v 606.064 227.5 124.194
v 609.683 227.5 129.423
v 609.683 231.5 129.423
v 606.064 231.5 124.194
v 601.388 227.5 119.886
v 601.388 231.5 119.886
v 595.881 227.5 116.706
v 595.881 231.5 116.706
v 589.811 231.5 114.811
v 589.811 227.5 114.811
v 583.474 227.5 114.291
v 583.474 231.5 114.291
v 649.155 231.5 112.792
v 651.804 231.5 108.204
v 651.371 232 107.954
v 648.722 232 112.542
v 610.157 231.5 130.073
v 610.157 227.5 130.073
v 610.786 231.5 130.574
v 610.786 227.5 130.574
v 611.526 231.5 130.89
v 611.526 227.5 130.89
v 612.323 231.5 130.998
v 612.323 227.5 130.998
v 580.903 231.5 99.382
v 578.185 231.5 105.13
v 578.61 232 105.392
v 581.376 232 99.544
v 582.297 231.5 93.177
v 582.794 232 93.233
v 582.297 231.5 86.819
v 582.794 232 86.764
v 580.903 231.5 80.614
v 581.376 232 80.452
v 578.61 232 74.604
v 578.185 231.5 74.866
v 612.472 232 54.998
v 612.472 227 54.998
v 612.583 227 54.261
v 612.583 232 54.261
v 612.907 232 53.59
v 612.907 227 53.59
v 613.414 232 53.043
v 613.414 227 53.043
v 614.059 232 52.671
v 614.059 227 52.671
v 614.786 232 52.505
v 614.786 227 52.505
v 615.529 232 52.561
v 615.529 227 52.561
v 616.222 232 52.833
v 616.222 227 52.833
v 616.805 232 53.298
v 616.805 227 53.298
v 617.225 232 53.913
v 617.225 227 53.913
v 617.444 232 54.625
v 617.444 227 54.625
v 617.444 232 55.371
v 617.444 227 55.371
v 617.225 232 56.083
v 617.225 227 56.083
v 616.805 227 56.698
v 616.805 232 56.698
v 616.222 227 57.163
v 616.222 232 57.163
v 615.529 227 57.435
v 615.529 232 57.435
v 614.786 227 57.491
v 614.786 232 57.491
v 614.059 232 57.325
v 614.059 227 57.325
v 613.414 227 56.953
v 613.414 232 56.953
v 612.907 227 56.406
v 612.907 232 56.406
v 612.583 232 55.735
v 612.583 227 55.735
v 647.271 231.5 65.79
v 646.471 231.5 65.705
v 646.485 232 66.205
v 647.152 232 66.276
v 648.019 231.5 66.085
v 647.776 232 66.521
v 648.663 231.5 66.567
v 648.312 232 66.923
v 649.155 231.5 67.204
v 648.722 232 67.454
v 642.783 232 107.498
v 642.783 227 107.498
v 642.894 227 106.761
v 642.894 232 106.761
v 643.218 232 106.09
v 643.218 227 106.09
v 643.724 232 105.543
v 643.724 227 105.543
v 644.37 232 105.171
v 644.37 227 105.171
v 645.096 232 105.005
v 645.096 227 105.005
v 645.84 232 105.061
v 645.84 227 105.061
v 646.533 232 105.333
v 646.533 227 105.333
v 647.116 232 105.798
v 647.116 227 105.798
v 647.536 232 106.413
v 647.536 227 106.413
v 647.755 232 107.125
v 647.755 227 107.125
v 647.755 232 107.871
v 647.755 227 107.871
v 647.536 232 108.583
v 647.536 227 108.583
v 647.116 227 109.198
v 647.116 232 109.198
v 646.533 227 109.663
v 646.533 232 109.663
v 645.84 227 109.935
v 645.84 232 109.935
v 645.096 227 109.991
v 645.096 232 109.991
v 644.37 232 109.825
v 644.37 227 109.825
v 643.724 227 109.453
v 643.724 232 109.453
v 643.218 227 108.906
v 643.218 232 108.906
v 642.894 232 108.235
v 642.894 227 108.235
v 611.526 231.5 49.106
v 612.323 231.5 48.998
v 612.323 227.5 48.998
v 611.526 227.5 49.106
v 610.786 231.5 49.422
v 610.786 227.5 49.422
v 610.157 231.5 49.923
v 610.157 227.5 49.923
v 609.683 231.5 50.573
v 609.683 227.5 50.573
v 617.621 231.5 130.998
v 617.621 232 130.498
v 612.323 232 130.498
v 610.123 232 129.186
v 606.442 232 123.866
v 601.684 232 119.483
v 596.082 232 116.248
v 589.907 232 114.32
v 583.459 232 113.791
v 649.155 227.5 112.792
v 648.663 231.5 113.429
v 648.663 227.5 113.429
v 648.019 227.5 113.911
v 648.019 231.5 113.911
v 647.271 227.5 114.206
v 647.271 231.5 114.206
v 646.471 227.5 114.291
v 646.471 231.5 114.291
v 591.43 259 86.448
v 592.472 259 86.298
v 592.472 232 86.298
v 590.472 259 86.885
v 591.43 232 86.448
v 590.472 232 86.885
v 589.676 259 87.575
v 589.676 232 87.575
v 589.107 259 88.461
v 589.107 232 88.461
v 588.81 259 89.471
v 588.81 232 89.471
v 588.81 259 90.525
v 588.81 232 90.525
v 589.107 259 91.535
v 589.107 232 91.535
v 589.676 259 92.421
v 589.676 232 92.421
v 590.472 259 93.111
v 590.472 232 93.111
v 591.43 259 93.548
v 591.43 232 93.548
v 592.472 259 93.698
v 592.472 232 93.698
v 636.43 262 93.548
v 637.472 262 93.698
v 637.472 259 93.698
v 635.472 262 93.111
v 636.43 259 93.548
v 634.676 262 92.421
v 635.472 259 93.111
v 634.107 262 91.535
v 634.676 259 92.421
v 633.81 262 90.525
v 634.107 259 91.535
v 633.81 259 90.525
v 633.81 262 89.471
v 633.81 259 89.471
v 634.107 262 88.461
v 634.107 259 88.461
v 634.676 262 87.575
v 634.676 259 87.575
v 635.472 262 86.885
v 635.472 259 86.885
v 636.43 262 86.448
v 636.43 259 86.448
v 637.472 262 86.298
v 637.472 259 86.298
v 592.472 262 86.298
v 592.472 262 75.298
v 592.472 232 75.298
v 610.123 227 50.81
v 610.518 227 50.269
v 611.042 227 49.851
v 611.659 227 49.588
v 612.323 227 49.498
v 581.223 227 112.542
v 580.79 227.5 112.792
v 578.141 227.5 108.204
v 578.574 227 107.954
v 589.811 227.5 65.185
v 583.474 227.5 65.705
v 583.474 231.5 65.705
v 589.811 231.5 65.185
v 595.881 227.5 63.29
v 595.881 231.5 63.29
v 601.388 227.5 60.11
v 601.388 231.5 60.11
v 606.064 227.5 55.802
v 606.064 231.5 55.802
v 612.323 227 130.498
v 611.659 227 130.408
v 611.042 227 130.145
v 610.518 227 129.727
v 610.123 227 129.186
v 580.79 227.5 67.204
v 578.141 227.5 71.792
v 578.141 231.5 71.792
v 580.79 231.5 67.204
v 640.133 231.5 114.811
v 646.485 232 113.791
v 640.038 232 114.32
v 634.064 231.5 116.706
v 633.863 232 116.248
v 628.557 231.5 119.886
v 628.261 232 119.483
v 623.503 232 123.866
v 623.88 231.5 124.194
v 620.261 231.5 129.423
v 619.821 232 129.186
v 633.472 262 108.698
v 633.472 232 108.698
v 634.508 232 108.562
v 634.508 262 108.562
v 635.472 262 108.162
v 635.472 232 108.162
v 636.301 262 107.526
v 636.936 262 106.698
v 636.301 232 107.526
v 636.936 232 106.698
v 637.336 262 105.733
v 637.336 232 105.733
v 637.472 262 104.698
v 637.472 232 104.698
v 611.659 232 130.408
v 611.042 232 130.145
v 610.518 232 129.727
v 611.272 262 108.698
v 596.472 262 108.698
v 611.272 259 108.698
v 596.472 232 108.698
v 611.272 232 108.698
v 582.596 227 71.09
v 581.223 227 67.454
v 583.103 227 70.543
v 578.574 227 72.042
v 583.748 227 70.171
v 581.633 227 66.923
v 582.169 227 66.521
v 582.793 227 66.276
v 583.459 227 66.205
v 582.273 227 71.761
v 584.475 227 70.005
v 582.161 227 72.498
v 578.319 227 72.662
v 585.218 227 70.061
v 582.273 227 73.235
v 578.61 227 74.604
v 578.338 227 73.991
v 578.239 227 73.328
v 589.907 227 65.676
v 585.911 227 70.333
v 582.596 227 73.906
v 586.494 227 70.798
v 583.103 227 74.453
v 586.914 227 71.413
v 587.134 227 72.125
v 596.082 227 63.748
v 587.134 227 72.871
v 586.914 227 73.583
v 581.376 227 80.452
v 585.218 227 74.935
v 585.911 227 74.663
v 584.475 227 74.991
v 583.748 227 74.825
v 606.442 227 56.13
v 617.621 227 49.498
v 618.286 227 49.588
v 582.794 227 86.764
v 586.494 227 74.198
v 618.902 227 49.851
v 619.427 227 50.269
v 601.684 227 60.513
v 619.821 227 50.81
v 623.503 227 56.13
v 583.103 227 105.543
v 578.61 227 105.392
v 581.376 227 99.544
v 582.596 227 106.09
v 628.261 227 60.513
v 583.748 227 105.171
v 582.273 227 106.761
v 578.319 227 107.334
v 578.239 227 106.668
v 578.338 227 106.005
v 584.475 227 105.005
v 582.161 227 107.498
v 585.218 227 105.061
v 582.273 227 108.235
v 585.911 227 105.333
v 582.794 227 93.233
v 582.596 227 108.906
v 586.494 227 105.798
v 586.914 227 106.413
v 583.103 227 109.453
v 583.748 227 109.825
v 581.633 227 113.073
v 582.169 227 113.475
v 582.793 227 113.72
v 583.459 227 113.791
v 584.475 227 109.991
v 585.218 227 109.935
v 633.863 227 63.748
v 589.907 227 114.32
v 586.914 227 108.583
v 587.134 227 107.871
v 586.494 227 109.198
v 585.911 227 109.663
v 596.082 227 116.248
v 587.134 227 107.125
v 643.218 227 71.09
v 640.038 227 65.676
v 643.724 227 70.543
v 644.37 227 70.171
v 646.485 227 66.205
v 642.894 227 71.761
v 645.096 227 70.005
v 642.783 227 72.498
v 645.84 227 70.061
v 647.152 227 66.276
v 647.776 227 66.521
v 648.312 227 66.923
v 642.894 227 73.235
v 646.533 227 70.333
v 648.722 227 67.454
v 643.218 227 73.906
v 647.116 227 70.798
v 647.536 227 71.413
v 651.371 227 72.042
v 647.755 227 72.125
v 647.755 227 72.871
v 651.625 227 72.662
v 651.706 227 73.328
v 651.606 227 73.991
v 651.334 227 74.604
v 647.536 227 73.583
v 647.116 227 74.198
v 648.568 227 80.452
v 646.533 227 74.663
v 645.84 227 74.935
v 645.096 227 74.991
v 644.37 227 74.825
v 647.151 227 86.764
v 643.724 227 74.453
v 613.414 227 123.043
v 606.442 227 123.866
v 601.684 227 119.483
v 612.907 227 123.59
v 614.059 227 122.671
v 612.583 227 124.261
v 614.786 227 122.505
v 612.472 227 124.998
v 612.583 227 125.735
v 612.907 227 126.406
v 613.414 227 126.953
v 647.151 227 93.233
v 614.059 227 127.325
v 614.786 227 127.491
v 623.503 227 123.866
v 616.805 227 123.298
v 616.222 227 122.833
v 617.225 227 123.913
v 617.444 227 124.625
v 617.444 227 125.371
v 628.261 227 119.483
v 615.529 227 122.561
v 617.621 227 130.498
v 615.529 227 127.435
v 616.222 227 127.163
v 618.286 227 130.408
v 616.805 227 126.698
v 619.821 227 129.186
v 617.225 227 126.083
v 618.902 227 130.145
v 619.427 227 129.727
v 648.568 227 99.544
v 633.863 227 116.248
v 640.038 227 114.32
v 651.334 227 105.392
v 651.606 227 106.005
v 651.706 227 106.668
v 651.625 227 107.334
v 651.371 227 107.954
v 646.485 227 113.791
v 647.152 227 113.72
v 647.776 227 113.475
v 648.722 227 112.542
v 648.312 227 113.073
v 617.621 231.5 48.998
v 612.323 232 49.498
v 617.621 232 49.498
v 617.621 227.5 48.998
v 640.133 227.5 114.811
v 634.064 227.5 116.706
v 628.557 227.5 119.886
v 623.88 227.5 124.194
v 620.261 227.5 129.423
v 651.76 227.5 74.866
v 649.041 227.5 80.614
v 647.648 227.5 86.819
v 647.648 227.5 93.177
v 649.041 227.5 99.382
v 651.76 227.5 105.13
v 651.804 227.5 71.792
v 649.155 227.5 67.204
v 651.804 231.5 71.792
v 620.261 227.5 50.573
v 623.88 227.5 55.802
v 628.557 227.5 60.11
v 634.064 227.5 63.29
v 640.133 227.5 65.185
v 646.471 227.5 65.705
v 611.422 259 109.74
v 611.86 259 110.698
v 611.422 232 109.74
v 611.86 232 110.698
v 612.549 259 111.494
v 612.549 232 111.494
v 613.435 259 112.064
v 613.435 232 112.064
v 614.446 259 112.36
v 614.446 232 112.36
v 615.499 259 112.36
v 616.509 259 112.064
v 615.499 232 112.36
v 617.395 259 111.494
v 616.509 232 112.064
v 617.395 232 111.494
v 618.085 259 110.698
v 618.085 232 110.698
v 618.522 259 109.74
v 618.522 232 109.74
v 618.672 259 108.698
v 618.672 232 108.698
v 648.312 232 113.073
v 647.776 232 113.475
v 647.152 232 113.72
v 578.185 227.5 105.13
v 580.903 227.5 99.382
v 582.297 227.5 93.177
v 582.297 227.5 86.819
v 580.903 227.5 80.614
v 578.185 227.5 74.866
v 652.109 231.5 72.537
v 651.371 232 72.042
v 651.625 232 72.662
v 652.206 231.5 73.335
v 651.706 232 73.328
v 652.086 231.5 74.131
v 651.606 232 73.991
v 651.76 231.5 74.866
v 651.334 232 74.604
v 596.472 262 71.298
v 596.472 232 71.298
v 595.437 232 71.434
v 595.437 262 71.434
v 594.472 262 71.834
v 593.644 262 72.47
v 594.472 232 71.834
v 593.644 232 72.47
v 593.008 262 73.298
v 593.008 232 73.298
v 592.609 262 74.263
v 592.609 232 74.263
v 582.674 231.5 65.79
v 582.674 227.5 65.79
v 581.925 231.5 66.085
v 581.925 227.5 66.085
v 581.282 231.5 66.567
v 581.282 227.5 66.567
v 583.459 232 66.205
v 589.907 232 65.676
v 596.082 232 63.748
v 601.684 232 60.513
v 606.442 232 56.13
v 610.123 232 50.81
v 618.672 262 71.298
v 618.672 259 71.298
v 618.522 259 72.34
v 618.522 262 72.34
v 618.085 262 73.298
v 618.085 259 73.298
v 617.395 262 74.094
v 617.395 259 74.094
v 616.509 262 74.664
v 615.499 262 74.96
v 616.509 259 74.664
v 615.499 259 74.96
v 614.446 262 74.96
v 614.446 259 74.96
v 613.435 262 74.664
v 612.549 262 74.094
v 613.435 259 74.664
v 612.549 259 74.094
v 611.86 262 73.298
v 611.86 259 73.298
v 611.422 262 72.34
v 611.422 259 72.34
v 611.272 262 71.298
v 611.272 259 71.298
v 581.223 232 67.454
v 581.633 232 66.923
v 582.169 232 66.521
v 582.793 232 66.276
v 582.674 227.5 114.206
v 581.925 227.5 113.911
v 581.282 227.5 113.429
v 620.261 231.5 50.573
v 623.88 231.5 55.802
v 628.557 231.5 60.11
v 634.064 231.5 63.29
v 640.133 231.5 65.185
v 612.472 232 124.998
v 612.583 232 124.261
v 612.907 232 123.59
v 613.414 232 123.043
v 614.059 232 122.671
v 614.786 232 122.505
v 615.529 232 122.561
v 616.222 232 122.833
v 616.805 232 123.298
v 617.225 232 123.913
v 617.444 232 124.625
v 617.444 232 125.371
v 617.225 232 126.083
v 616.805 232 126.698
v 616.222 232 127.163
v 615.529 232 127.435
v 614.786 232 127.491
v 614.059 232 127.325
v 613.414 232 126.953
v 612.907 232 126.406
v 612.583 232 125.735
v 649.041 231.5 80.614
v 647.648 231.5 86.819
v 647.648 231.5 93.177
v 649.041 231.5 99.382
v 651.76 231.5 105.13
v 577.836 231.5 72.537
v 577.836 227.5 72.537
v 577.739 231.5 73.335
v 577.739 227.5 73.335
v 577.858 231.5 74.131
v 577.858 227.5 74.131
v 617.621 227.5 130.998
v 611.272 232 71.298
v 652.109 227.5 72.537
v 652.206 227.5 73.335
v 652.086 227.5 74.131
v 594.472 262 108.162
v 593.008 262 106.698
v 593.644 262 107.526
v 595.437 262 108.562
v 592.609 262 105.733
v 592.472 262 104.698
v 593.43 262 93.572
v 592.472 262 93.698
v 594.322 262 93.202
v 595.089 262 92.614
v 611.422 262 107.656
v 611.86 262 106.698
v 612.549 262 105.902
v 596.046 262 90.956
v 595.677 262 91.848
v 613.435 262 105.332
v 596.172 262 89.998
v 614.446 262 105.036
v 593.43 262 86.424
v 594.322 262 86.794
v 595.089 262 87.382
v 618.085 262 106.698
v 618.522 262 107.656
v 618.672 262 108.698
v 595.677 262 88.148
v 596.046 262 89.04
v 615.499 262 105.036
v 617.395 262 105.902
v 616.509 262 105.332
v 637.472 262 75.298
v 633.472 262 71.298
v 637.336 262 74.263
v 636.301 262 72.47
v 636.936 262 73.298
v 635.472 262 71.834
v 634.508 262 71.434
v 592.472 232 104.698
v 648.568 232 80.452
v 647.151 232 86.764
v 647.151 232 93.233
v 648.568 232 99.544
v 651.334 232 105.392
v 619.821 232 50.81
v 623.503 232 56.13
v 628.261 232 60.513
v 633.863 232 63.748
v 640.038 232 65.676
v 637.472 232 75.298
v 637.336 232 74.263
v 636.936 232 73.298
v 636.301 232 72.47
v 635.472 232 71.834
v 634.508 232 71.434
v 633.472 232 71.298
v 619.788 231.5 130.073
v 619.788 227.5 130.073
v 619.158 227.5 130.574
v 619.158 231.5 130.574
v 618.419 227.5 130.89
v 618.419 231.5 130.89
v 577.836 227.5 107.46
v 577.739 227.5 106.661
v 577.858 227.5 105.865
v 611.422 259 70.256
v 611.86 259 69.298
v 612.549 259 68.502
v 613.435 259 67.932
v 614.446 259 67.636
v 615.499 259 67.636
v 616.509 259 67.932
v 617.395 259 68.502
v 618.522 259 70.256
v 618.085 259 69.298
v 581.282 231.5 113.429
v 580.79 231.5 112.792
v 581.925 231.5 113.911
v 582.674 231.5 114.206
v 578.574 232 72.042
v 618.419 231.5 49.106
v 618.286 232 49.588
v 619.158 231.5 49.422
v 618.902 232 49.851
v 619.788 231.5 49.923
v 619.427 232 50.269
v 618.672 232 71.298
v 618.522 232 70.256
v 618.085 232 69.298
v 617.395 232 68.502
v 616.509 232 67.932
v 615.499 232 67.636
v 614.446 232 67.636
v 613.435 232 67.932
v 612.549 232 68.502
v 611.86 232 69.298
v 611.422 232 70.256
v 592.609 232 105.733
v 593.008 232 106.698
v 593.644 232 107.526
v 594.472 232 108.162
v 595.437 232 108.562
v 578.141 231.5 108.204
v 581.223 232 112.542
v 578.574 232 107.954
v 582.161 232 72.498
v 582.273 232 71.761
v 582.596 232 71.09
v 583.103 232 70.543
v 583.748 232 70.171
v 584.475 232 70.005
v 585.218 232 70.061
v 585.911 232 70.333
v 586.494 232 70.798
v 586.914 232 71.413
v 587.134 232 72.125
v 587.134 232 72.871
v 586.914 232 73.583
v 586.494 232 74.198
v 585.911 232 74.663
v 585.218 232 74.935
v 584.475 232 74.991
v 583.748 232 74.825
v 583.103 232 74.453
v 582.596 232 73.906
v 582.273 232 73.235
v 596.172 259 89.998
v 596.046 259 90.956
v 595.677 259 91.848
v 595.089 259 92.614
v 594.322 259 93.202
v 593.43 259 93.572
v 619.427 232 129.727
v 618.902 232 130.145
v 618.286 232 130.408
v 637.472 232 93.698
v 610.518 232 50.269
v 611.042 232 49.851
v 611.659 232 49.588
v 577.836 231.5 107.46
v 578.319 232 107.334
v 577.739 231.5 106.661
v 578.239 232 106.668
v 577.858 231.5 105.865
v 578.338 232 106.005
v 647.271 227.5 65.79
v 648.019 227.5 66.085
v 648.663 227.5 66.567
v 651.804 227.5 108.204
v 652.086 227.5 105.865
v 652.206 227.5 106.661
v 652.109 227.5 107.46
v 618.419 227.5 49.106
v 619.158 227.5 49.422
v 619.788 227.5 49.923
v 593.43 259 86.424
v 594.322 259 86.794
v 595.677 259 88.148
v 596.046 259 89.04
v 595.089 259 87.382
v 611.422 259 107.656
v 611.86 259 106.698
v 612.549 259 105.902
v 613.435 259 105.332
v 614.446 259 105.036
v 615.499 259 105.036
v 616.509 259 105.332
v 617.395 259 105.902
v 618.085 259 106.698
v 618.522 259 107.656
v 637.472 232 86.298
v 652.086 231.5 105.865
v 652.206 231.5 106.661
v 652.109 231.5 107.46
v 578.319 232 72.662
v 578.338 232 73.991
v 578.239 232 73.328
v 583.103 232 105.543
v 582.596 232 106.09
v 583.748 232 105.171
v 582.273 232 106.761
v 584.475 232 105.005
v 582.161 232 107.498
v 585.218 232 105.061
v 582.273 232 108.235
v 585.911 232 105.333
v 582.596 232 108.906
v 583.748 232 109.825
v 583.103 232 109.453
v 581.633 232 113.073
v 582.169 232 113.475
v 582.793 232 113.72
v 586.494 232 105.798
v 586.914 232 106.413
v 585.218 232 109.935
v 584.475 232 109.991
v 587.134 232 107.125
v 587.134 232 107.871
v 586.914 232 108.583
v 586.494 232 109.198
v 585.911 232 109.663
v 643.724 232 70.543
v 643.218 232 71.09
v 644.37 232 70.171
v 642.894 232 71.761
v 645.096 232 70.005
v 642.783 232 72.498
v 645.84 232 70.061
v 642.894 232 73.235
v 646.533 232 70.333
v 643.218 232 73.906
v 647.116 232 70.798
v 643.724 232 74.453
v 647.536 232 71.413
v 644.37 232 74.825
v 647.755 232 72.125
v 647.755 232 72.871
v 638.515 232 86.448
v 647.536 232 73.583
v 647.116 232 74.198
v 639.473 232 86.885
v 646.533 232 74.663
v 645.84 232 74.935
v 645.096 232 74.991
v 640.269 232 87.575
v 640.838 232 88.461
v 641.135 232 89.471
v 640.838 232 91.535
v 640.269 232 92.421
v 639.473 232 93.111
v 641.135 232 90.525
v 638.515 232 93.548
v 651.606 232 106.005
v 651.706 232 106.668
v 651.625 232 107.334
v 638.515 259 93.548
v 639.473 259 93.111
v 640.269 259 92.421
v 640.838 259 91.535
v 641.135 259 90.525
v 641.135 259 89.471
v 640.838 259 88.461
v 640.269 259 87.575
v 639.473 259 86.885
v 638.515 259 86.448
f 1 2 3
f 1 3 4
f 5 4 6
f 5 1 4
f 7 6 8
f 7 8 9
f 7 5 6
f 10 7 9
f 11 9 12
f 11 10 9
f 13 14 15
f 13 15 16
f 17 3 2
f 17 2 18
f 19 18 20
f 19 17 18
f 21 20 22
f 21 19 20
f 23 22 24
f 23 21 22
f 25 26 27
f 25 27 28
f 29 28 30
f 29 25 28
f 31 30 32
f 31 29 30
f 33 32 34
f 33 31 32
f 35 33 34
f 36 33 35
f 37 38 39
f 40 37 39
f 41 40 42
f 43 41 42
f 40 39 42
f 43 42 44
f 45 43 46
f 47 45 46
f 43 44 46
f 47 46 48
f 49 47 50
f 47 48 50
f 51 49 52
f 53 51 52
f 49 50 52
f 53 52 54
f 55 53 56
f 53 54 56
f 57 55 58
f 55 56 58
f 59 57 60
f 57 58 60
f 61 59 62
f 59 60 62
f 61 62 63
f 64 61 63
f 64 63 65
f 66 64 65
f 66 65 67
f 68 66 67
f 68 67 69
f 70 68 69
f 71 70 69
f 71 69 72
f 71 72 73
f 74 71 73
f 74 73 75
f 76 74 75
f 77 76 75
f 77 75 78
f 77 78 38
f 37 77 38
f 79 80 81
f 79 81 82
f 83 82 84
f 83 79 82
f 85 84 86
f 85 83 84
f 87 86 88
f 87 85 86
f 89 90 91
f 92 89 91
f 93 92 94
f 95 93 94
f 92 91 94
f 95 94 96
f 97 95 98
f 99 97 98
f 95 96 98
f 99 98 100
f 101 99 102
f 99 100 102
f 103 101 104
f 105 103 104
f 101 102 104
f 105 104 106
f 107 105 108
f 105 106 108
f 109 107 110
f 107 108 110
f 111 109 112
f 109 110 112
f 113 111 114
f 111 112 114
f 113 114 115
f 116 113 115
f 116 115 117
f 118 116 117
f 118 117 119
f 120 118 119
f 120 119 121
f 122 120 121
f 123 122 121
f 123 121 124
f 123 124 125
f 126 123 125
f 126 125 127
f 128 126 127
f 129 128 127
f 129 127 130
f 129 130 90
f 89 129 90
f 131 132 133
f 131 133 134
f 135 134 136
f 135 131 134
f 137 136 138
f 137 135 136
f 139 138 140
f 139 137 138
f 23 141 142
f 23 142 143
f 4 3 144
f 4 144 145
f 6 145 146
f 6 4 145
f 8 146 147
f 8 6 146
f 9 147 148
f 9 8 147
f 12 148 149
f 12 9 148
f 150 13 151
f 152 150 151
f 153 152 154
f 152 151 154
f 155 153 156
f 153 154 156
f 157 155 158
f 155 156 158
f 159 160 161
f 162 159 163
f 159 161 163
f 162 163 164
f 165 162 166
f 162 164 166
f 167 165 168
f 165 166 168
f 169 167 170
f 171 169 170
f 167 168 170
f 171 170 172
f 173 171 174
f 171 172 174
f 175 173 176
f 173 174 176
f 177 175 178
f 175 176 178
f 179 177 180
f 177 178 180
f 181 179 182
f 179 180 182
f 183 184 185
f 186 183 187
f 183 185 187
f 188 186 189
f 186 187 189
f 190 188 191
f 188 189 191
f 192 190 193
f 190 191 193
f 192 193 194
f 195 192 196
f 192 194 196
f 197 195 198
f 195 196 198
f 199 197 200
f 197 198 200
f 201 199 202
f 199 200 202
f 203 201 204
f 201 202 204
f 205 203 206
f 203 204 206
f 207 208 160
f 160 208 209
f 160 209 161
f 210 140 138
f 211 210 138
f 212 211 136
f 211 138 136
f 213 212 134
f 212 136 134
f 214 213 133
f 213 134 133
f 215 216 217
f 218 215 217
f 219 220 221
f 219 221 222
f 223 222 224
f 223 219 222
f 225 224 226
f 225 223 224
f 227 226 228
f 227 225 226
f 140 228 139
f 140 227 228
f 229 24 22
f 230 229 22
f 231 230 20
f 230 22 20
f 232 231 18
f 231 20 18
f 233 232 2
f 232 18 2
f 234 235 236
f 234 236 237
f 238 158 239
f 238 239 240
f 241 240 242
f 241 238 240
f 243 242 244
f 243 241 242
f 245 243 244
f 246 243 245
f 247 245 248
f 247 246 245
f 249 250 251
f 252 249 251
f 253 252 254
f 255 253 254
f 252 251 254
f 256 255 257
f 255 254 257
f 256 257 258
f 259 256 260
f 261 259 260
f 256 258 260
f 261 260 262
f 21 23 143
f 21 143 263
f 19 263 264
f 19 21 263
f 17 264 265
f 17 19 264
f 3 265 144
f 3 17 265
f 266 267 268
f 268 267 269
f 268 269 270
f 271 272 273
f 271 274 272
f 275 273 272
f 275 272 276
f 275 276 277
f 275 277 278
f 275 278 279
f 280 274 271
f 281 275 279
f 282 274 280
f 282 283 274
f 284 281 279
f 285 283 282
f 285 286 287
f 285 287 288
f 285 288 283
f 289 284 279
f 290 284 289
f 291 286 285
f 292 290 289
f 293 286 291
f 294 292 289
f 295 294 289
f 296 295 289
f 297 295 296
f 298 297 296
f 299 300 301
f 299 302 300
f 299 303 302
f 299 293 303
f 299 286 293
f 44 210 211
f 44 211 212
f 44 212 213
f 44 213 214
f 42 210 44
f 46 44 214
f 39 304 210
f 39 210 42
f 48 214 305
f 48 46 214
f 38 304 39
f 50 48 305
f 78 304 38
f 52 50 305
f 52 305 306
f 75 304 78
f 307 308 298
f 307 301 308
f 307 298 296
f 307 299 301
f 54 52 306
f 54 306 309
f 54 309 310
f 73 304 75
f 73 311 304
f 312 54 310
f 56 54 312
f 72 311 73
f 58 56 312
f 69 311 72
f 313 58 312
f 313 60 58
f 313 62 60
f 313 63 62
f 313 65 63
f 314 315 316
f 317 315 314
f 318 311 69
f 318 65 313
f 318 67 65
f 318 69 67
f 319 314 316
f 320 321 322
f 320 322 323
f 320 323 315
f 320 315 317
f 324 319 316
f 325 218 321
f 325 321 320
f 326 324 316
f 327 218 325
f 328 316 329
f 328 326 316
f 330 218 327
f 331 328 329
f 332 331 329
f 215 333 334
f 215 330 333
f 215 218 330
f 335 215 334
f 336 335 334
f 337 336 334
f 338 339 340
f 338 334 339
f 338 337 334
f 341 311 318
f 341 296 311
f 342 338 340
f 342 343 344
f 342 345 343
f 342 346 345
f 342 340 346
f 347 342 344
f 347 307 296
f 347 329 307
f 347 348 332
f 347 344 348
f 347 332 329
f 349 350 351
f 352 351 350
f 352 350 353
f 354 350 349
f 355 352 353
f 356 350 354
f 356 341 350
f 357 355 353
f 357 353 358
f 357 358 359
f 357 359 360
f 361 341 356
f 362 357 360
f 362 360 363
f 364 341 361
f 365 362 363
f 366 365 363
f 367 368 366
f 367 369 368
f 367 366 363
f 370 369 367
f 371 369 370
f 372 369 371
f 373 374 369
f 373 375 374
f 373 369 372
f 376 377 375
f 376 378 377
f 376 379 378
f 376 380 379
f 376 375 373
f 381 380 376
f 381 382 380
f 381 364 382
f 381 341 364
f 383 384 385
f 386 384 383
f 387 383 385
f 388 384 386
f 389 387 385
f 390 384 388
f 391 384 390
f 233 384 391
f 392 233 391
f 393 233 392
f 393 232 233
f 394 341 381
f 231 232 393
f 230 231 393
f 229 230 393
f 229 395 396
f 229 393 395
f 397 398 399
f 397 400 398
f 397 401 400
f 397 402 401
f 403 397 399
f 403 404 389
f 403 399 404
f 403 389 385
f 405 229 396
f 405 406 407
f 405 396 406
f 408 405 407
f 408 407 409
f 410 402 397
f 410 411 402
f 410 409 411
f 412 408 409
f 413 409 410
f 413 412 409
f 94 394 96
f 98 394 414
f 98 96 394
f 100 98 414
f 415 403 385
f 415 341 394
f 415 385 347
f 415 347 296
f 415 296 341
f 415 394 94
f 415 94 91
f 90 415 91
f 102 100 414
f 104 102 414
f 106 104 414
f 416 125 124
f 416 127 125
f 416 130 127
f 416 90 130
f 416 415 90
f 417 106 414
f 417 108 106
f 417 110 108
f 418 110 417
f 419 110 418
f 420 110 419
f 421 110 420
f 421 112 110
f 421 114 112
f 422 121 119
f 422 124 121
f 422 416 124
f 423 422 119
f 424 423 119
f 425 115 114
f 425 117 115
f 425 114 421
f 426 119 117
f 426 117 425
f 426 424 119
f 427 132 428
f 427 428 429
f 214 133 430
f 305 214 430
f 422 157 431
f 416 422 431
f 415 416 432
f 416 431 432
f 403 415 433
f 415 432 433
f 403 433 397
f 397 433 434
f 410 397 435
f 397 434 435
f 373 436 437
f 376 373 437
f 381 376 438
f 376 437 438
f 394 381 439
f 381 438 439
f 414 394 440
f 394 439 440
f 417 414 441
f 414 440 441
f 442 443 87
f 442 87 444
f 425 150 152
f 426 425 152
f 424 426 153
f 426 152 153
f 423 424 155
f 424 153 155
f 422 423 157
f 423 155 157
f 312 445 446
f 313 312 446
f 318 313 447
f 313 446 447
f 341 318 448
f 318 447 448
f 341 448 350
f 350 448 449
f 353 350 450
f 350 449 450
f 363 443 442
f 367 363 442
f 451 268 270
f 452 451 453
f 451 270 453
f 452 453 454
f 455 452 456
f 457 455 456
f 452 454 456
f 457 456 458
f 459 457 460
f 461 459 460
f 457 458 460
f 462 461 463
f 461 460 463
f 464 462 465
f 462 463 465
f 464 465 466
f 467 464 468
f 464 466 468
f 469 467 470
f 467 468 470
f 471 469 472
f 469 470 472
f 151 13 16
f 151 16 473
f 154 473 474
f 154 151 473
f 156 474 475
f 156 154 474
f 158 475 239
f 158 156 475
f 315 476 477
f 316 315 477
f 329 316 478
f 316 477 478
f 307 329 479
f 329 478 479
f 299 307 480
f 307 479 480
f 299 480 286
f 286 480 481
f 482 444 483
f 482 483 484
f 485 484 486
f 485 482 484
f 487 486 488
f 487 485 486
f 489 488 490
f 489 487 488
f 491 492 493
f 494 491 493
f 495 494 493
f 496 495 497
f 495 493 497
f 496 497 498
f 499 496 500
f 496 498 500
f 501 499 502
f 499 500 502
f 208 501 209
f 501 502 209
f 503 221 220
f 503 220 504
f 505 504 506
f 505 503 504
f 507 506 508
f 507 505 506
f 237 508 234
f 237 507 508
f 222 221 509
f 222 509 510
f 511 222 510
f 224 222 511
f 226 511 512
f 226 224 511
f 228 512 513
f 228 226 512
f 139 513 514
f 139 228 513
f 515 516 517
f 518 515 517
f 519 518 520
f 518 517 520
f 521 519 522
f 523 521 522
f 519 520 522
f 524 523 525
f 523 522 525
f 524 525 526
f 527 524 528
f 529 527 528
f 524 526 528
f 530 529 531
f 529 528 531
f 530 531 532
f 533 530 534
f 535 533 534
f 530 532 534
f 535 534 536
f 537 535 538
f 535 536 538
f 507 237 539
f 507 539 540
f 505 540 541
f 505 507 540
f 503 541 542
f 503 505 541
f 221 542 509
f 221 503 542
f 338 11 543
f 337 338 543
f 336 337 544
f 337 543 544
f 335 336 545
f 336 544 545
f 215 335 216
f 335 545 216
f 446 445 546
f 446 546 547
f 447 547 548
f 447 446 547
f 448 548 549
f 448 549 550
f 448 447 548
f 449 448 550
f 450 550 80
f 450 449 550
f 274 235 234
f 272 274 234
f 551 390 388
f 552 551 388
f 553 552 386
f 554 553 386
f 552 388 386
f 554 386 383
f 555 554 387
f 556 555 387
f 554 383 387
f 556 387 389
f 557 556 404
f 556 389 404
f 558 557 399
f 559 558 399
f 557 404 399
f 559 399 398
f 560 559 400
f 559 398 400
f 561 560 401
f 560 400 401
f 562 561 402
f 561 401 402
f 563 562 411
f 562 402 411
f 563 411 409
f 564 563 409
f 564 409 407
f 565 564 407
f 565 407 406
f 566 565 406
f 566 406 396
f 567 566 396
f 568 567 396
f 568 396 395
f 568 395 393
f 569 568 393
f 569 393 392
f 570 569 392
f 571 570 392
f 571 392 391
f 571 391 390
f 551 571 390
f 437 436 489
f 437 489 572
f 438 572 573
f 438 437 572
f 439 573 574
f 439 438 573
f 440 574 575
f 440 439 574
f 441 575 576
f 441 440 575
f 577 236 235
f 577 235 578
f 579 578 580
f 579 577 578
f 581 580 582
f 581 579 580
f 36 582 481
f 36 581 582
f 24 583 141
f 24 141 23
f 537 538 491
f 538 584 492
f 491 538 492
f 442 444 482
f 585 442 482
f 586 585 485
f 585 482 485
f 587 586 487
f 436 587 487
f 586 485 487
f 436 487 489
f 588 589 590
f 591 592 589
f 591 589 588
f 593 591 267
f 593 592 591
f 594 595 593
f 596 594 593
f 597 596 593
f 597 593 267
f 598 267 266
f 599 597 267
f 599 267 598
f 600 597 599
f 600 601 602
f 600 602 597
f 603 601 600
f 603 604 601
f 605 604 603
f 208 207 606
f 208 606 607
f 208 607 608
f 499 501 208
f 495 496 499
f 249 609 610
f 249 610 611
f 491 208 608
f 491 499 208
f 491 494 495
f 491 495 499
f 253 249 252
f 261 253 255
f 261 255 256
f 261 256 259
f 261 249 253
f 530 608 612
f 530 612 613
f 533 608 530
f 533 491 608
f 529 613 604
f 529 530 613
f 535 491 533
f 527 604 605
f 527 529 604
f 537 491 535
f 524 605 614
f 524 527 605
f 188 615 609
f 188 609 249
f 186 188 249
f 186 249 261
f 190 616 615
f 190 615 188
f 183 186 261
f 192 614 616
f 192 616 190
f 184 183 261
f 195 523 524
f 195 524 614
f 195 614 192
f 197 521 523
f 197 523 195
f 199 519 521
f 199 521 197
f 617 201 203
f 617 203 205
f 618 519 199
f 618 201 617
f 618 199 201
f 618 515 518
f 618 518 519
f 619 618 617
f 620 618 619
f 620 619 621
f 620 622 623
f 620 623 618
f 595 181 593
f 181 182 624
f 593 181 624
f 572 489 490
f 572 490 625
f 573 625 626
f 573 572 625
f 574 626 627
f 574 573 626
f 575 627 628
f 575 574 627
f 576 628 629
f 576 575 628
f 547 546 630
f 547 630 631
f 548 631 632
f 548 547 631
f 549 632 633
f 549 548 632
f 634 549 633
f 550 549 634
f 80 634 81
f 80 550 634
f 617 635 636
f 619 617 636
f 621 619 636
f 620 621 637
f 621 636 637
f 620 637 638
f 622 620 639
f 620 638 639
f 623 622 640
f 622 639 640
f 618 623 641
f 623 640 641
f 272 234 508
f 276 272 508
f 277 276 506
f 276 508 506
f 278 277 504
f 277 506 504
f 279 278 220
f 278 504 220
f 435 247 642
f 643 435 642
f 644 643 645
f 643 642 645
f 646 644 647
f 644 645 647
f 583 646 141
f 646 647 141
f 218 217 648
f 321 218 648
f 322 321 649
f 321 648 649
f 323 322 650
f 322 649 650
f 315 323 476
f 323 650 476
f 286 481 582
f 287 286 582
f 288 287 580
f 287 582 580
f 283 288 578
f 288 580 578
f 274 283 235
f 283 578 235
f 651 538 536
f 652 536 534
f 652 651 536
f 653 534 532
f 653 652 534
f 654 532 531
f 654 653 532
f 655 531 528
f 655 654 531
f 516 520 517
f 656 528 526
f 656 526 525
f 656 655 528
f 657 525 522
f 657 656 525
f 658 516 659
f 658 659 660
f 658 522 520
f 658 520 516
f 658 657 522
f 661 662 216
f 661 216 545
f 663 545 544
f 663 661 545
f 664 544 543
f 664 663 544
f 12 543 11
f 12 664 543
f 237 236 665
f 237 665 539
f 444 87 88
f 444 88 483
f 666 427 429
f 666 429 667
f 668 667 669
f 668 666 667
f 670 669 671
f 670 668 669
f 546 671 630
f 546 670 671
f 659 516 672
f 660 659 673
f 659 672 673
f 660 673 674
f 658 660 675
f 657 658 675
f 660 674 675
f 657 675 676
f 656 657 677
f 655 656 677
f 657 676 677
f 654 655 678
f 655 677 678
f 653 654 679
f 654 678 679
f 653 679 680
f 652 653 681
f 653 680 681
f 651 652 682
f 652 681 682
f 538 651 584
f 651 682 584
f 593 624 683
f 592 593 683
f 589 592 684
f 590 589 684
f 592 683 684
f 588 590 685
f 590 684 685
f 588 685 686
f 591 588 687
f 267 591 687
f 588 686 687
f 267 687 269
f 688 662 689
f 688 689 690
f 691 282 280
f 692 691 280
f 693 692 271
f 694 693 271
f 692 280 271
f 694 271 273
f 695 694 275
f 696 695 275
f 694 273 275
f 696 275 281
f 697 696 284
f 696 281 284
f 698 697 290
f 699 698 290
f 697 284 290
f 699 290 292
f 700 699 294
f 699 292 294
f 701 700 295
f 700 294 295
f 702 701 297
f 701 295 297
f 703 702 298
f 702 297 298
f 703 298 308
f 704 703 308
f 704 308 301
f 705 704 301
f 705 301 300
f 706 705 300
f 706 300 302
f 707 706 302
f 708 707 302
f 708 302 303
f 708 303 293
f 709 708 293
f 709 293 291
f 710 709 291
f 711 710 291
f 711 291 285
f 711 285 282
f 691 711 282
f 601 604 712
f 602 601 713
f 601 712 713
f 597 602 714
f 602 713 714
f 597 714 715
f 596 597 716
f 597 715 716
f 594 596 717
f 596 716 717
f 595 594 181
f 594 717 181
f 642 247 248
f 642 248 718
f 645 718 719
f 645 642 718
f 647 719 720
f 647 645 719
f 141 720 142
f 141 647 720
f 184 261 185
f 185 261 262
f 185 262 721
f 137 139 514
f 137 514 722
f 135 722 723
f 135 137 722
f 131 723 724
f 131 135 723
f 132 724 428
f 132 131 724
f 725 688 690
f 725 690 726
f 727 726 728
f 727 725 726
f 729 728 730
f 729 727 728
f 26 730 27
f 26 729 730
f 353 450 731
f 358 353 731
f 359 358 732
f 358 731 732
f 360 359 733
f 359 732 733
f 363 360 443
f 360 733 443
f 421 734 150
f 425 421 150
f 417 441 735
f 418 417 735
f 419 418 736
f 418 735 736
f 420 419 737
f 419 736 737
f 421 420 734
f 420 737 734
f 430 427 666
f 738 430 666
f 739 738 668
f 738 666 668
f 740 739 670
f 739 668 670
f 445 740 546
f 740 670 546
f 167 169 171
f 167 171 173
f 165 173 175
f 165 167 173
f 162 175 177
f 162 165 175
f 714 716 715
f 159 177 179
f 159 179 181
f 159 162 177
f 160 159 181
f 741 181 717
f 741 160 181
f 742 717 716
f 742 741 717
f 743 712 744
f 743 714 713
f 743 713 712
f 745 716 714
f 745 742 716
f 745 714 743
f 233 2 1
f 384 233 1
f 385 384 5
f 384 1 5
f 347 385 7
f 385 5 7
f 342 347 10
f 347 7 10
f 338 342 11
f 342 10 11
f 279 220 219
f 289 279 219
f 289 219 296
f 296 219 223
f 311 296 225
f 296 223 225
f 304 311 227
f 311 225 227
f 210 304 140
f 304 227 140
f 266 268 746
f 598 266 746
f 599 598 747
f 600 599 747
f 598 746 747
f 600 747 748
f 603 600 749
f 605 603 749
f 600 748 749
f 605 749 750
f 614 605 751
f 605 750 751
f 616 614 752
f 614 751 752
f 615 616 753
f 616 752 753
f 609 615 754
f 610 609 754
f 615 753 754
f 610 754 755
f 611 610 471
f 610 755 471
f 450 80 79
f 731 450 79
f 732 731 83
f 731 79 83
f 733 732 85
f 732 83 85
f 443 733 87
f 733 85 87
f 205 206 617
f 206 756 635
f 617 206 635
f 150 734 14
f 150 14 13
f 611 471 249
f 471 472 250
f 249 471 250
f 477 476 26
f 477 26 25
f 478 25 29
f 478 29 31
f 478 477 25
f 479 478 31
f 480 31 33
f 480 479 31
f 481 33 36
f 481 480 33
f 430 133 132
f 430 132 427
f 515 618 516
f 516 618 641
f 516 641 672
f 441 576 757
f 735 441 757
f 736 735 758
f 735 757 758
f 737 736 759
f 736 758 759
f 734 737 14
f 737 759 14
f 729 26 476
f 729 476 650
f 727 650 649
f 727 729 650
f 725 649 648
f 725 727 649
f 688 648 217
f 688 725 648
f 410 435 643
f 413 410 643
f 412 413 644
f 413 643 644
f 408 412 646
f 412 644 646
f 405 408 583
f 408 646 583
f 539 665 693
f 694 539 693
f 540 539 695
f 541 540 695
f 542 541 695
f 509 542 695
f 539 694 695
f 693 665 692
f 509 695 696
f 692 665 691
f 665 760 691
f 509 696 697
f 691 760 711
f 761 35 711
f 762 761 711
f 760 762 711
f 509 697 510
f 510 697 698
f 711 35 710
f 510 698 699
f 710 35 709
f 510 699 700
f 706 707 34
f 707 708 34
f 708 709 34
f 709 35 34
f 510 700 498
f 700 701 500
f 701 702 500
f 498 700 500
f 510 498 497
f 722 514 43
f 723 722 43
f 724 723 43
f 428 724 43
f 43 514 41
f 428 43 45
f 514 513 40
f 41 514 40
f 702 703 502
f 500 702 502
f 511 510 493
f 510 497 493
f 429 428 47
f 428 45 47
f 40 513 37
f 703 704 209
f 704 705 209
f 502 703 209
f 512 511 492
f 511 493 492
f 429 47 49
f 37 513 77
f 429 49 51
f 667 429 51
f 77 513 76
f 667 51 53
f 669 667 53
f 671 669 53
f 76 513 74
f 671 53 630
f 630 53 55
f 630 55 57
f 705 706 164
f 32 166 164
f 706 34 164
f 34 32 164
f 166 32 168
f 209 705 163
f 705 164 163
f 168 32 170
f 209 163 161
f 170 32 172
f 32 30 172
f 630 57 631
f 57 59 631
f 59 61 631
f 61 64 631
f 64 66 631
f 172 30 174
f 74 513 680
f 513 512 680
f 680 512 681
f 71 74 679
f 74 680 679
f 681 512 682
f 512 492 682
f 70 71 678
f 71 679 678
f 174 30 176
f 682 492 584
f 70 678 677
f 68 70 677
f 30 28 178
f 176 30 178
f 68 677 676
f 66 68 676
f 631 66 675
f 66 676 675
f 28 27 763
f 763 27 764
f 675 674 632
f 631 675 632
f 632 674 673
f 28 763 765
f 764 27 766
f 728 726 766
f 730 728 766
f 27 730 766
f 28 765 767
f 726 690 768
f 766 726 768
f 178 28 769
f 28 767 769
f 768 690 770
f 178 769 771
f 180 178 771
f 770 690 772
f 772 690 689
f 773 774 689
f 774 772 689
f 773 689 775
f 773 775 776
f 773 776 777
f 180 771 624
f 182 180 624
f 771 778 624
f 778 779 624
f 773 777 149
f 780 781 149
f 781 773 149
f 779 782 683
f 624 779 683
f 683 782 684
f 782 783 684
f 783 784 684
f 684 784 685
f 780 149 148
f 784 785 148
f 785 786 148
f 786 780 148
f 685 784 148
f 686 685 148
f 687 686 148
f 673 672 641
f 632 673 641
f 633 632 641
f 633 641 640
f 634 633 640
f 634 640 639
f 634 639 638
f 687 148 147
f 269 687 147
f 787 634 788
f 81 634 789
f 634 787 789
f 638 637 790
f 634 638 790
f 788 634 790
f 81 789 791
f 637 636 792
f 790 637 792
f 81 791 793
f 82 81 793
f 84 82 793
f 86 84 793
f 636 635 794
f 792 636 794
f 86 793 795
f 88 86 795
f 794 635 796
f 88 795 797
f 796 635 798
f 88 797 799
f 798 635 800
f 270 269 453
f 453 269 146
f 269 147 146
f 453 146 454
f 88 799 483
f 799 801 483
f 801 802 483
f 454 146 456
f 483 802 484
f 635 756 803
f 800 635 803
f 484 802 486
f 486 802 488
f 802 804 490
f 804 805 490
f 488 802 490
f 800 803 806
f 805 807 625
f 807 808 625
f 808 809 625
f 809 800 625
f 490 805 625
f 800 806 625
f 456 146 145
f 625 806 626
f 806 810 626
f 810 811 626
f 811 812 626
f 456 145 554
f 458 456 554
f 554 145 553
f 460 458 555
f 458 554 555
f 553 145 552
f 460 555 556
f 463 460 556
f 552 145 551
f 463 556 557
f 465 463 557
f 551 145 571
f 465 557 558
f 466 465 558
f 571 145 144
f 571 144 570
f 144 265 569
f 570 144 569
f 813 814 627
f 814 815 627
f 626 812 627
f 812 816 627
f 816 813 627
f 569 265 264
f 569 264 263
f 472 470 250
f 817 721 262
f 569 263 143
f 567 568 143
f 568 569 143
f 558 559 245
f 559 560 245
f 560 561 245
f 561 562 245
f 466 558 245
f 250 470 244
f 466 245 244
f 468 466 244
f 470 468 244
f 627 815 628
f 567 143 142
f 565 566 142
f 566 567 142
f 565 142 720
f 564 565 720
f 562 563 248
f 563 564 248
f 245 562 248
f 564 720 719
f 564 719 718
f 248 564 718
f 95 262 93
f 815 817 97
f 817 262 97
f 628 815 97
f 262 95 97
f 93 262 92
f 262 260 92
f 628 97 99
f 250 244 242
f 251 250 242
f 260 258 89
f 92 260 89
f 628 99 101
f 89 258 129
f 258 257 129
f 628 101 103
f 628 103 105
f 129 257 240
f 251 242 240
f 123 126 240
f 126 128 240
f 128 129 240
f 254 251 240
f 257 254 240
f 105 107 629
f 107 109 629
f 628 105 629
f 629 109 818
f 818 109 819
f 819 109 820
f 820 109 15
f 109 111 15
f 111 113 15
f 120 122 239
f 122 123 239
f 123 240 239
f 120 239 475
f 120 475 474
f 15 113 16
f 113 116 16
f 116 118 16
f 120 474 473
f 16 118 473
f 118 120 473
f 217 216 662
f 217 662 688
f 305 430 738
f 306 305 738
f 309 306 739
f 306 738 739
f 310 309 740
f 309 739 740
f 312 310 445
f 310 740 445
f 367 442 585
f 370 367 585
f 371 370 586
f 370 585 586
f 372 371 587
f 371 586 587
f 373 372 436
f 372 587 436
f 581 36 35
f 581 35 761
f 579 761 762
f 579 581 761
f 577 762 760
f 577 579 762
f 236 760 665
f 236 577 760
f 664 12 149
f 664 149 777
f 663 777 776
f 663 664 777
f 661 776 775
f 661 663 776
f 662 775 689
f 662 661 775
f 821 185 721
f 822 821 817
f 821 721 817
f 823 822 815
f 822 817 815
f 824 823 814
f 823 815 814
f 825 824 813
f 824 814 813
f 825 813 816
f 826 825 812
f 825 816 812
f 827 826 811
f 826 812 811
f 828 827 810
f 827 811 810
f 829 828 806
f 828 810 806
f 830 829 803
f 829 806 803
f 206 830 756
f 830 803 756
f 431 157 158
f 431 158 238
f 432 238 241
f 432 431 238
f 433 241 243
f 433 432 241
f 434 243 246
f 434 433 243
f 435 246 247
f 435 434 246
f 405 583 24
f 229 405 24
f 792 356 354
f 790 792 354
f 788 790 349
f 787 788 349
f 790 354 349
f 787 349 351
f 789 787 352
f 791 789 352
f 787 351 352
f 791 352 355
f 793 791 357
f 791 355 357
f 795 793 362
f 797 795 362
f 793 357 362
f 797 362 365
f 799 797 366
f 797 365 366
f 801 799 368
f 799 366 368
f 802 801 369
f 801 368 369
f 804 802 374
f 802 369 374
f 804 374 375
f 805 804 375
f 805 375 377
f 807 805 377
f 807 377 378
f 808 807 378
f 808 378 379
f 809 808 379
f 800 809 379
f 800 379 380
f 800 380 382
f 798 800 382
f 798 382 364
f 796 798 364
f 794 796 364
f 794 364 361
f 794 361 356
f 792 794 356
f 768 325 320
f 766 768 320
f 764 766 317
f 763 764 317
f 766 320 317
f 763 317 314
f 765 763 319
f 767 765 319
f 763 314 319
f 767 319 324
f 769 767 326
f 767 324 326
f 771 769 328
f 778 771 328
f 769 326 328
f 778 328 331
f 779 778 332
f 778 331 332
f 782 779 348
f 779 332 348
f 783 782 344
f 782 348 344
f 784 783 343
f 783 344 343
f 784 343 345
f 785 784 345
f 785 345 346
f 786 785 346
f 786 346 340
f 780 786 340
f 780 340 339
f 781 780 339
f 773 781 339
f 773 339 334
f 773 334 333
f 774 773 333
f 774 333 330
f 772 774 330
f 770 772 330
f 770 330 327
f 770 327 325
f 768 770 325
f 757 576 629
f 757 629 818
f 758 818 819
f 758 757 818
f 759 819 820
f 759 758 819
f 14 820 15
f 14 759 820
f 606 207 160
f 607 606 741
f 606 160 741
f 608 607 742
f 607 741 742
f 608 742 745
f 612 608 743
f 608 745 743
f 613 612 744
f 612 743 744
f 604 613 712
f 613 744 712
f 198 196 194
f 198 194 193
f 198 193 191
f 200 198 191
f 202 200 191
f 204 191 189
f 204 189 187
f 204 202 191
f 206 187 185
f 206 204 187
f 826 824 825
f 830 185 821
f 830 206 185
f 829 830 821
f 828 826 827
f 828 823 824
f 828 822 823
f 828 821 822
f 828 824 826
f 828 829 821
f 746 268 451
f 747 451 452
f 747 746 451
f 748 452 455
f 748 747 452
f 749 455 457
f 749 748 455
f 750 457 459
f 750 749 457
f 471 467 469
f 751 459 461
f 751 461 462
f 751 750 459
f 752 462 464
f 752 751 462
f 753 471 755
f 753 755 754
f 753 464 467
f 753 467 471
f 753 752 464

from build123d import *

# Parameters (mm, degrees)
BOSS_EXTRUDE1_DEPTH    = 5
F_10_CLEARANCE_HOLE1_D = 5
FILLET1_R              = 3
CHAMFER1_SIZE          = 0.5
BOSS_EXTRUDE4_DEPTH    = 30
SKETCH5_R              = 3.7
BOSS_EXTRUDE5_DEPTH    = 27


with BuildPart() as part:
    # Sketch1 → Boss-Extrude1 (new body)
    with BuildSketch(Plane.XZ.offset(-227)):
        with BuildLine():
            Line((610.472328875, 48.998023491), (619.472328875, 48.998023491))
            ThreePointArc((619.472328875, 48.998023491), (631.222328875, 61.852197868), (648.22937043, 65.600909174))
            Line((648.22937043, 65.600909174), (652.72937043, 73.395137808))
            ThreePointArc((652.72937043, 73.395137808), (647.472328875, 89.998023491), (652.72937043, 106.600909174))
            Line((652.72937043, 106.600909174), (648.22937043, 114.395137808))
            ThreePointArc((648.22937043, 114.395137808), (631.222328875, 118.143849114), (619.472328875, 130.998023491))
            Line((619.472328875, 130.998023491), (610.472328875, 130.998023491))
            ThreePointArc((610.472328875, 130.998023491), (598.722328875, 118.143849114), (581.71528732, 114.395137808))
            Line((581.71528732, 114.395137808), (577.21528732, 106.600909174))
            ThreePointArc((577.21528732, 106.600909174), (582.472328875, 89.998023491), (577.21528732, 73.395137808))
            Line((577.21528732, 73.395137808), (581.71528732, 65.600909174))
            ThreePointArc((581.71528732, 65.600909174), (598.722328875, 61.852197868), (610.472328875, 48.998023491))
        make_face()
    extrude(amount=-BOSS_EXTRUDE1_DEPTH)

    # #10 Clearance Hole1 (through all)
    with Locations(Plane(origin=(0, 232, 0), x_dir=(1, 0, 0), z_dir=(0, 1, 0))):
        with Locations((614.972328875, -124.998023491), (584.661439743, -72.498023491), (584.661439743, -107.498023491), (614.972328875, -54.998023491), (645.283218008, -107.498023491), (645.283218008, -72.498023491)):
            Hole(F_10_CLEARANCE_HOLE1_D / 2)

    # Fillet1
    fillet1_edges = [part.edges().sort_by_distance(p)[0] for p in [
        (581.71528732, 229.5, 65.600909174),
        (577.21528732, 229.5, 73.395137808),
        (577.21528732, 229.5, 106.600909174),
        (581.71528732, 229.5, 114.395137808),
        (610.472328875, 229.5, 130.998023491),
        (619.472328875, 229.5, 130.998023491),
        (648.22937043, 229.5, 114.395137808),
        (652.72937043, 229.5, 106.600909174),
        (652.72937043, 229.5, 73.395137808),
        (648.22937043, 229.5, 65.600909174),
        (619.472328875, 229.5, 48.998023491),
        (610.472328875, 229.5, 48.998023491),
    ]]
    fillet(fillet1_edges, radius=FILLET1_R)

    # Chamfer1
    chamfer1_edges = [part.edges().sort_by_distance(p)[0] for p in [
        (647.472328875, 227, 89.998023491),
        (647.472328875, 232, 89.998023491),
        (598.722328875, 227, 61.852197868),
        (614.972328875, 227, 48.998023491),
        (631.222328875, 227, 61.852197868),
        (650.47937043, 227, 69.498023491),
        (650.47937043, 227, 110.498023491),
        (631.222328875, 227, 118.143849114),
        (614.972328875, 227, 130.998023491),
        (598.722328875, 227, 118.143849114),
        (579.46528732, 227, 110.498023491),
        (582.472328875, 227, 89.998023491),
        (579.46528732, 227, 69.498023491),
        (581.92524679, 227, 113.911492617),
        (610.786198162, 227, 130.57437066),
        (610.786198162, 227, 49.421676322),
        (577.739116077, 227, 73.335145448),
        (619.158459588, 227, 49.421676322),
        (648.01941096, 227, 113.911492617),
        (619.158459588, 227, 130.57437066),
        (652.205541673, 227, 73.335145448),
        (648.01941096, 227, 66.084554366),
        (581.92524679, 227, 66.084554366),
        (577.739116077, 227, 106.660901535),
        (652.205541673, 227, 106.660901535),
        (650.47937043, 232, 110.498023491),
        (598.722328875, 232, 61.852197868),
        (579.46528732, 232, 69.498023491),
        (582.472328875, 232, 89.998023491),
        (579.46528732, 232, 110.498023491),
        (598.722328875, 232, 118.143849114),
        (614.972328875, 232, 130.998023491),
        (631.222328875, 232, 118.143849114),
        (650.47937043, 232, 69.498023491),
        (631.222328875, 232, 61.852197868),
        (614.972328875, 232, 48.998023491),
        (581.92524679, 232, 113.911492617),
        (610.786198162, 232, 130.57437066),
        (610.786198162, 232, 49.421676322),
        (577.739116077, 232, 73.335145448),
        (619.158459588, 232, 49.421676322),
        (648.01941096, 232, 113.911492617),
        (619.158459588, 232, 130.57437066),
        (652.205541673, 232, 73.335145448),
        (648.01941096, 232, 66.084554366),
        (581.92524679, 232, 66.084554366),
        (577.739116077, 232, 106.660901535),
        (652.205541673, 232, 106.660901535),
    ]]
    chamfer(chamfer1_edges, length=CHAMFER1_SIZE)

    # Sketch4 → Boss-Extrude4 (add)
    with BuildSketch(Plane(origin=(0, 232, 0), x_dir=(1, 0, 0), z_dir=(0, 1, 0))):
        with BuildLine():
            ThreePointArc((611.272328875, -108.698023491), (614.972328875, -104.998023491), (618.672328875, -108.698023491))
            Line((618.672328875, -108.698023491), (633.472328875, -108.698023491))
            ThreePointArc((633.472328875, -108.698023491), (636.300756, -107.526450616), (637.472328875, -104.698023491))
            Line((637.472328875, -104.698023491), (637.472328875, -93.698023491))
            ThreePointArc((637.472328875, -93.698023491), (633.772328875, -89.998023491), (637.472328875, -86.298023491))
            Line((637.472328875, -86.298023491), (637.472328875, -75.298023491))
            ThreePointArc((637.472328875, -75.298023491), (636.300756, -72.469596366), (633.472328875, -71.298023491))
            Line((633.472328875, -71.298023491), (618.672328875, -71.298023491))
            ThreePointArc((618.672328875, -71.298023491), (614.972328875, -74.998023491), (611.272328875, -71.298023491))
            Line((611.272328875, -71.298023491), (596.472328875, -71.298023491))
            ThreePointArc((596.472328875, -71.298023491), (593.64390175, -72.469596366), (592.472328875, -75.298023491))
            Line((592.472328875, -75.298023491), (592.472328875, -86.298023491))
            ThreePointArc((592.472328875, -86.298023491), (595.088623966, -87.381728401), (596.172328875, -89.998023491))
            ThreePointArc((596.172328875, -89.998023491), (595.088623966, -92.614318581), (592.472328875, -93.698023491))
            Line((592.472328875, -93.698023491), (592.472328875, -104.698023491))
            ThreePointArc((592.472328875, -104.698023491), (593.64390175, -107.526450616), (596.472328875, -108.698023491))
            Line((596.472328875, -108.698023491), (611.272328875, -108.698023491))
        make_face()
    extrude(amount=BOSS_EXTRUDE4_DEPTH)

    # Sketch5 → Boss-Extrude5 (add)
    with BuildSketch(Plane(origin=(0, 232, 0), x_dir=(1, 0, 0), z_dir=(0, 1, 0))):
        with Locations((614.972328875, -71.298023491)):
            Circle(SKETCH5_R)
        with Locations((637.472328875, -89.998023491)):
            Circle(SKETCH5_R)
        with Locations((614.972328875, -108.698023491)):
            Circle(SKETCH5_R)
        with Locations((592.472328875, -89.998023491)):
            Circle(SKETCH5_R)
    extrude(amount=BOSS_EXTRUDE5_DEPTH)


solid = part.part
